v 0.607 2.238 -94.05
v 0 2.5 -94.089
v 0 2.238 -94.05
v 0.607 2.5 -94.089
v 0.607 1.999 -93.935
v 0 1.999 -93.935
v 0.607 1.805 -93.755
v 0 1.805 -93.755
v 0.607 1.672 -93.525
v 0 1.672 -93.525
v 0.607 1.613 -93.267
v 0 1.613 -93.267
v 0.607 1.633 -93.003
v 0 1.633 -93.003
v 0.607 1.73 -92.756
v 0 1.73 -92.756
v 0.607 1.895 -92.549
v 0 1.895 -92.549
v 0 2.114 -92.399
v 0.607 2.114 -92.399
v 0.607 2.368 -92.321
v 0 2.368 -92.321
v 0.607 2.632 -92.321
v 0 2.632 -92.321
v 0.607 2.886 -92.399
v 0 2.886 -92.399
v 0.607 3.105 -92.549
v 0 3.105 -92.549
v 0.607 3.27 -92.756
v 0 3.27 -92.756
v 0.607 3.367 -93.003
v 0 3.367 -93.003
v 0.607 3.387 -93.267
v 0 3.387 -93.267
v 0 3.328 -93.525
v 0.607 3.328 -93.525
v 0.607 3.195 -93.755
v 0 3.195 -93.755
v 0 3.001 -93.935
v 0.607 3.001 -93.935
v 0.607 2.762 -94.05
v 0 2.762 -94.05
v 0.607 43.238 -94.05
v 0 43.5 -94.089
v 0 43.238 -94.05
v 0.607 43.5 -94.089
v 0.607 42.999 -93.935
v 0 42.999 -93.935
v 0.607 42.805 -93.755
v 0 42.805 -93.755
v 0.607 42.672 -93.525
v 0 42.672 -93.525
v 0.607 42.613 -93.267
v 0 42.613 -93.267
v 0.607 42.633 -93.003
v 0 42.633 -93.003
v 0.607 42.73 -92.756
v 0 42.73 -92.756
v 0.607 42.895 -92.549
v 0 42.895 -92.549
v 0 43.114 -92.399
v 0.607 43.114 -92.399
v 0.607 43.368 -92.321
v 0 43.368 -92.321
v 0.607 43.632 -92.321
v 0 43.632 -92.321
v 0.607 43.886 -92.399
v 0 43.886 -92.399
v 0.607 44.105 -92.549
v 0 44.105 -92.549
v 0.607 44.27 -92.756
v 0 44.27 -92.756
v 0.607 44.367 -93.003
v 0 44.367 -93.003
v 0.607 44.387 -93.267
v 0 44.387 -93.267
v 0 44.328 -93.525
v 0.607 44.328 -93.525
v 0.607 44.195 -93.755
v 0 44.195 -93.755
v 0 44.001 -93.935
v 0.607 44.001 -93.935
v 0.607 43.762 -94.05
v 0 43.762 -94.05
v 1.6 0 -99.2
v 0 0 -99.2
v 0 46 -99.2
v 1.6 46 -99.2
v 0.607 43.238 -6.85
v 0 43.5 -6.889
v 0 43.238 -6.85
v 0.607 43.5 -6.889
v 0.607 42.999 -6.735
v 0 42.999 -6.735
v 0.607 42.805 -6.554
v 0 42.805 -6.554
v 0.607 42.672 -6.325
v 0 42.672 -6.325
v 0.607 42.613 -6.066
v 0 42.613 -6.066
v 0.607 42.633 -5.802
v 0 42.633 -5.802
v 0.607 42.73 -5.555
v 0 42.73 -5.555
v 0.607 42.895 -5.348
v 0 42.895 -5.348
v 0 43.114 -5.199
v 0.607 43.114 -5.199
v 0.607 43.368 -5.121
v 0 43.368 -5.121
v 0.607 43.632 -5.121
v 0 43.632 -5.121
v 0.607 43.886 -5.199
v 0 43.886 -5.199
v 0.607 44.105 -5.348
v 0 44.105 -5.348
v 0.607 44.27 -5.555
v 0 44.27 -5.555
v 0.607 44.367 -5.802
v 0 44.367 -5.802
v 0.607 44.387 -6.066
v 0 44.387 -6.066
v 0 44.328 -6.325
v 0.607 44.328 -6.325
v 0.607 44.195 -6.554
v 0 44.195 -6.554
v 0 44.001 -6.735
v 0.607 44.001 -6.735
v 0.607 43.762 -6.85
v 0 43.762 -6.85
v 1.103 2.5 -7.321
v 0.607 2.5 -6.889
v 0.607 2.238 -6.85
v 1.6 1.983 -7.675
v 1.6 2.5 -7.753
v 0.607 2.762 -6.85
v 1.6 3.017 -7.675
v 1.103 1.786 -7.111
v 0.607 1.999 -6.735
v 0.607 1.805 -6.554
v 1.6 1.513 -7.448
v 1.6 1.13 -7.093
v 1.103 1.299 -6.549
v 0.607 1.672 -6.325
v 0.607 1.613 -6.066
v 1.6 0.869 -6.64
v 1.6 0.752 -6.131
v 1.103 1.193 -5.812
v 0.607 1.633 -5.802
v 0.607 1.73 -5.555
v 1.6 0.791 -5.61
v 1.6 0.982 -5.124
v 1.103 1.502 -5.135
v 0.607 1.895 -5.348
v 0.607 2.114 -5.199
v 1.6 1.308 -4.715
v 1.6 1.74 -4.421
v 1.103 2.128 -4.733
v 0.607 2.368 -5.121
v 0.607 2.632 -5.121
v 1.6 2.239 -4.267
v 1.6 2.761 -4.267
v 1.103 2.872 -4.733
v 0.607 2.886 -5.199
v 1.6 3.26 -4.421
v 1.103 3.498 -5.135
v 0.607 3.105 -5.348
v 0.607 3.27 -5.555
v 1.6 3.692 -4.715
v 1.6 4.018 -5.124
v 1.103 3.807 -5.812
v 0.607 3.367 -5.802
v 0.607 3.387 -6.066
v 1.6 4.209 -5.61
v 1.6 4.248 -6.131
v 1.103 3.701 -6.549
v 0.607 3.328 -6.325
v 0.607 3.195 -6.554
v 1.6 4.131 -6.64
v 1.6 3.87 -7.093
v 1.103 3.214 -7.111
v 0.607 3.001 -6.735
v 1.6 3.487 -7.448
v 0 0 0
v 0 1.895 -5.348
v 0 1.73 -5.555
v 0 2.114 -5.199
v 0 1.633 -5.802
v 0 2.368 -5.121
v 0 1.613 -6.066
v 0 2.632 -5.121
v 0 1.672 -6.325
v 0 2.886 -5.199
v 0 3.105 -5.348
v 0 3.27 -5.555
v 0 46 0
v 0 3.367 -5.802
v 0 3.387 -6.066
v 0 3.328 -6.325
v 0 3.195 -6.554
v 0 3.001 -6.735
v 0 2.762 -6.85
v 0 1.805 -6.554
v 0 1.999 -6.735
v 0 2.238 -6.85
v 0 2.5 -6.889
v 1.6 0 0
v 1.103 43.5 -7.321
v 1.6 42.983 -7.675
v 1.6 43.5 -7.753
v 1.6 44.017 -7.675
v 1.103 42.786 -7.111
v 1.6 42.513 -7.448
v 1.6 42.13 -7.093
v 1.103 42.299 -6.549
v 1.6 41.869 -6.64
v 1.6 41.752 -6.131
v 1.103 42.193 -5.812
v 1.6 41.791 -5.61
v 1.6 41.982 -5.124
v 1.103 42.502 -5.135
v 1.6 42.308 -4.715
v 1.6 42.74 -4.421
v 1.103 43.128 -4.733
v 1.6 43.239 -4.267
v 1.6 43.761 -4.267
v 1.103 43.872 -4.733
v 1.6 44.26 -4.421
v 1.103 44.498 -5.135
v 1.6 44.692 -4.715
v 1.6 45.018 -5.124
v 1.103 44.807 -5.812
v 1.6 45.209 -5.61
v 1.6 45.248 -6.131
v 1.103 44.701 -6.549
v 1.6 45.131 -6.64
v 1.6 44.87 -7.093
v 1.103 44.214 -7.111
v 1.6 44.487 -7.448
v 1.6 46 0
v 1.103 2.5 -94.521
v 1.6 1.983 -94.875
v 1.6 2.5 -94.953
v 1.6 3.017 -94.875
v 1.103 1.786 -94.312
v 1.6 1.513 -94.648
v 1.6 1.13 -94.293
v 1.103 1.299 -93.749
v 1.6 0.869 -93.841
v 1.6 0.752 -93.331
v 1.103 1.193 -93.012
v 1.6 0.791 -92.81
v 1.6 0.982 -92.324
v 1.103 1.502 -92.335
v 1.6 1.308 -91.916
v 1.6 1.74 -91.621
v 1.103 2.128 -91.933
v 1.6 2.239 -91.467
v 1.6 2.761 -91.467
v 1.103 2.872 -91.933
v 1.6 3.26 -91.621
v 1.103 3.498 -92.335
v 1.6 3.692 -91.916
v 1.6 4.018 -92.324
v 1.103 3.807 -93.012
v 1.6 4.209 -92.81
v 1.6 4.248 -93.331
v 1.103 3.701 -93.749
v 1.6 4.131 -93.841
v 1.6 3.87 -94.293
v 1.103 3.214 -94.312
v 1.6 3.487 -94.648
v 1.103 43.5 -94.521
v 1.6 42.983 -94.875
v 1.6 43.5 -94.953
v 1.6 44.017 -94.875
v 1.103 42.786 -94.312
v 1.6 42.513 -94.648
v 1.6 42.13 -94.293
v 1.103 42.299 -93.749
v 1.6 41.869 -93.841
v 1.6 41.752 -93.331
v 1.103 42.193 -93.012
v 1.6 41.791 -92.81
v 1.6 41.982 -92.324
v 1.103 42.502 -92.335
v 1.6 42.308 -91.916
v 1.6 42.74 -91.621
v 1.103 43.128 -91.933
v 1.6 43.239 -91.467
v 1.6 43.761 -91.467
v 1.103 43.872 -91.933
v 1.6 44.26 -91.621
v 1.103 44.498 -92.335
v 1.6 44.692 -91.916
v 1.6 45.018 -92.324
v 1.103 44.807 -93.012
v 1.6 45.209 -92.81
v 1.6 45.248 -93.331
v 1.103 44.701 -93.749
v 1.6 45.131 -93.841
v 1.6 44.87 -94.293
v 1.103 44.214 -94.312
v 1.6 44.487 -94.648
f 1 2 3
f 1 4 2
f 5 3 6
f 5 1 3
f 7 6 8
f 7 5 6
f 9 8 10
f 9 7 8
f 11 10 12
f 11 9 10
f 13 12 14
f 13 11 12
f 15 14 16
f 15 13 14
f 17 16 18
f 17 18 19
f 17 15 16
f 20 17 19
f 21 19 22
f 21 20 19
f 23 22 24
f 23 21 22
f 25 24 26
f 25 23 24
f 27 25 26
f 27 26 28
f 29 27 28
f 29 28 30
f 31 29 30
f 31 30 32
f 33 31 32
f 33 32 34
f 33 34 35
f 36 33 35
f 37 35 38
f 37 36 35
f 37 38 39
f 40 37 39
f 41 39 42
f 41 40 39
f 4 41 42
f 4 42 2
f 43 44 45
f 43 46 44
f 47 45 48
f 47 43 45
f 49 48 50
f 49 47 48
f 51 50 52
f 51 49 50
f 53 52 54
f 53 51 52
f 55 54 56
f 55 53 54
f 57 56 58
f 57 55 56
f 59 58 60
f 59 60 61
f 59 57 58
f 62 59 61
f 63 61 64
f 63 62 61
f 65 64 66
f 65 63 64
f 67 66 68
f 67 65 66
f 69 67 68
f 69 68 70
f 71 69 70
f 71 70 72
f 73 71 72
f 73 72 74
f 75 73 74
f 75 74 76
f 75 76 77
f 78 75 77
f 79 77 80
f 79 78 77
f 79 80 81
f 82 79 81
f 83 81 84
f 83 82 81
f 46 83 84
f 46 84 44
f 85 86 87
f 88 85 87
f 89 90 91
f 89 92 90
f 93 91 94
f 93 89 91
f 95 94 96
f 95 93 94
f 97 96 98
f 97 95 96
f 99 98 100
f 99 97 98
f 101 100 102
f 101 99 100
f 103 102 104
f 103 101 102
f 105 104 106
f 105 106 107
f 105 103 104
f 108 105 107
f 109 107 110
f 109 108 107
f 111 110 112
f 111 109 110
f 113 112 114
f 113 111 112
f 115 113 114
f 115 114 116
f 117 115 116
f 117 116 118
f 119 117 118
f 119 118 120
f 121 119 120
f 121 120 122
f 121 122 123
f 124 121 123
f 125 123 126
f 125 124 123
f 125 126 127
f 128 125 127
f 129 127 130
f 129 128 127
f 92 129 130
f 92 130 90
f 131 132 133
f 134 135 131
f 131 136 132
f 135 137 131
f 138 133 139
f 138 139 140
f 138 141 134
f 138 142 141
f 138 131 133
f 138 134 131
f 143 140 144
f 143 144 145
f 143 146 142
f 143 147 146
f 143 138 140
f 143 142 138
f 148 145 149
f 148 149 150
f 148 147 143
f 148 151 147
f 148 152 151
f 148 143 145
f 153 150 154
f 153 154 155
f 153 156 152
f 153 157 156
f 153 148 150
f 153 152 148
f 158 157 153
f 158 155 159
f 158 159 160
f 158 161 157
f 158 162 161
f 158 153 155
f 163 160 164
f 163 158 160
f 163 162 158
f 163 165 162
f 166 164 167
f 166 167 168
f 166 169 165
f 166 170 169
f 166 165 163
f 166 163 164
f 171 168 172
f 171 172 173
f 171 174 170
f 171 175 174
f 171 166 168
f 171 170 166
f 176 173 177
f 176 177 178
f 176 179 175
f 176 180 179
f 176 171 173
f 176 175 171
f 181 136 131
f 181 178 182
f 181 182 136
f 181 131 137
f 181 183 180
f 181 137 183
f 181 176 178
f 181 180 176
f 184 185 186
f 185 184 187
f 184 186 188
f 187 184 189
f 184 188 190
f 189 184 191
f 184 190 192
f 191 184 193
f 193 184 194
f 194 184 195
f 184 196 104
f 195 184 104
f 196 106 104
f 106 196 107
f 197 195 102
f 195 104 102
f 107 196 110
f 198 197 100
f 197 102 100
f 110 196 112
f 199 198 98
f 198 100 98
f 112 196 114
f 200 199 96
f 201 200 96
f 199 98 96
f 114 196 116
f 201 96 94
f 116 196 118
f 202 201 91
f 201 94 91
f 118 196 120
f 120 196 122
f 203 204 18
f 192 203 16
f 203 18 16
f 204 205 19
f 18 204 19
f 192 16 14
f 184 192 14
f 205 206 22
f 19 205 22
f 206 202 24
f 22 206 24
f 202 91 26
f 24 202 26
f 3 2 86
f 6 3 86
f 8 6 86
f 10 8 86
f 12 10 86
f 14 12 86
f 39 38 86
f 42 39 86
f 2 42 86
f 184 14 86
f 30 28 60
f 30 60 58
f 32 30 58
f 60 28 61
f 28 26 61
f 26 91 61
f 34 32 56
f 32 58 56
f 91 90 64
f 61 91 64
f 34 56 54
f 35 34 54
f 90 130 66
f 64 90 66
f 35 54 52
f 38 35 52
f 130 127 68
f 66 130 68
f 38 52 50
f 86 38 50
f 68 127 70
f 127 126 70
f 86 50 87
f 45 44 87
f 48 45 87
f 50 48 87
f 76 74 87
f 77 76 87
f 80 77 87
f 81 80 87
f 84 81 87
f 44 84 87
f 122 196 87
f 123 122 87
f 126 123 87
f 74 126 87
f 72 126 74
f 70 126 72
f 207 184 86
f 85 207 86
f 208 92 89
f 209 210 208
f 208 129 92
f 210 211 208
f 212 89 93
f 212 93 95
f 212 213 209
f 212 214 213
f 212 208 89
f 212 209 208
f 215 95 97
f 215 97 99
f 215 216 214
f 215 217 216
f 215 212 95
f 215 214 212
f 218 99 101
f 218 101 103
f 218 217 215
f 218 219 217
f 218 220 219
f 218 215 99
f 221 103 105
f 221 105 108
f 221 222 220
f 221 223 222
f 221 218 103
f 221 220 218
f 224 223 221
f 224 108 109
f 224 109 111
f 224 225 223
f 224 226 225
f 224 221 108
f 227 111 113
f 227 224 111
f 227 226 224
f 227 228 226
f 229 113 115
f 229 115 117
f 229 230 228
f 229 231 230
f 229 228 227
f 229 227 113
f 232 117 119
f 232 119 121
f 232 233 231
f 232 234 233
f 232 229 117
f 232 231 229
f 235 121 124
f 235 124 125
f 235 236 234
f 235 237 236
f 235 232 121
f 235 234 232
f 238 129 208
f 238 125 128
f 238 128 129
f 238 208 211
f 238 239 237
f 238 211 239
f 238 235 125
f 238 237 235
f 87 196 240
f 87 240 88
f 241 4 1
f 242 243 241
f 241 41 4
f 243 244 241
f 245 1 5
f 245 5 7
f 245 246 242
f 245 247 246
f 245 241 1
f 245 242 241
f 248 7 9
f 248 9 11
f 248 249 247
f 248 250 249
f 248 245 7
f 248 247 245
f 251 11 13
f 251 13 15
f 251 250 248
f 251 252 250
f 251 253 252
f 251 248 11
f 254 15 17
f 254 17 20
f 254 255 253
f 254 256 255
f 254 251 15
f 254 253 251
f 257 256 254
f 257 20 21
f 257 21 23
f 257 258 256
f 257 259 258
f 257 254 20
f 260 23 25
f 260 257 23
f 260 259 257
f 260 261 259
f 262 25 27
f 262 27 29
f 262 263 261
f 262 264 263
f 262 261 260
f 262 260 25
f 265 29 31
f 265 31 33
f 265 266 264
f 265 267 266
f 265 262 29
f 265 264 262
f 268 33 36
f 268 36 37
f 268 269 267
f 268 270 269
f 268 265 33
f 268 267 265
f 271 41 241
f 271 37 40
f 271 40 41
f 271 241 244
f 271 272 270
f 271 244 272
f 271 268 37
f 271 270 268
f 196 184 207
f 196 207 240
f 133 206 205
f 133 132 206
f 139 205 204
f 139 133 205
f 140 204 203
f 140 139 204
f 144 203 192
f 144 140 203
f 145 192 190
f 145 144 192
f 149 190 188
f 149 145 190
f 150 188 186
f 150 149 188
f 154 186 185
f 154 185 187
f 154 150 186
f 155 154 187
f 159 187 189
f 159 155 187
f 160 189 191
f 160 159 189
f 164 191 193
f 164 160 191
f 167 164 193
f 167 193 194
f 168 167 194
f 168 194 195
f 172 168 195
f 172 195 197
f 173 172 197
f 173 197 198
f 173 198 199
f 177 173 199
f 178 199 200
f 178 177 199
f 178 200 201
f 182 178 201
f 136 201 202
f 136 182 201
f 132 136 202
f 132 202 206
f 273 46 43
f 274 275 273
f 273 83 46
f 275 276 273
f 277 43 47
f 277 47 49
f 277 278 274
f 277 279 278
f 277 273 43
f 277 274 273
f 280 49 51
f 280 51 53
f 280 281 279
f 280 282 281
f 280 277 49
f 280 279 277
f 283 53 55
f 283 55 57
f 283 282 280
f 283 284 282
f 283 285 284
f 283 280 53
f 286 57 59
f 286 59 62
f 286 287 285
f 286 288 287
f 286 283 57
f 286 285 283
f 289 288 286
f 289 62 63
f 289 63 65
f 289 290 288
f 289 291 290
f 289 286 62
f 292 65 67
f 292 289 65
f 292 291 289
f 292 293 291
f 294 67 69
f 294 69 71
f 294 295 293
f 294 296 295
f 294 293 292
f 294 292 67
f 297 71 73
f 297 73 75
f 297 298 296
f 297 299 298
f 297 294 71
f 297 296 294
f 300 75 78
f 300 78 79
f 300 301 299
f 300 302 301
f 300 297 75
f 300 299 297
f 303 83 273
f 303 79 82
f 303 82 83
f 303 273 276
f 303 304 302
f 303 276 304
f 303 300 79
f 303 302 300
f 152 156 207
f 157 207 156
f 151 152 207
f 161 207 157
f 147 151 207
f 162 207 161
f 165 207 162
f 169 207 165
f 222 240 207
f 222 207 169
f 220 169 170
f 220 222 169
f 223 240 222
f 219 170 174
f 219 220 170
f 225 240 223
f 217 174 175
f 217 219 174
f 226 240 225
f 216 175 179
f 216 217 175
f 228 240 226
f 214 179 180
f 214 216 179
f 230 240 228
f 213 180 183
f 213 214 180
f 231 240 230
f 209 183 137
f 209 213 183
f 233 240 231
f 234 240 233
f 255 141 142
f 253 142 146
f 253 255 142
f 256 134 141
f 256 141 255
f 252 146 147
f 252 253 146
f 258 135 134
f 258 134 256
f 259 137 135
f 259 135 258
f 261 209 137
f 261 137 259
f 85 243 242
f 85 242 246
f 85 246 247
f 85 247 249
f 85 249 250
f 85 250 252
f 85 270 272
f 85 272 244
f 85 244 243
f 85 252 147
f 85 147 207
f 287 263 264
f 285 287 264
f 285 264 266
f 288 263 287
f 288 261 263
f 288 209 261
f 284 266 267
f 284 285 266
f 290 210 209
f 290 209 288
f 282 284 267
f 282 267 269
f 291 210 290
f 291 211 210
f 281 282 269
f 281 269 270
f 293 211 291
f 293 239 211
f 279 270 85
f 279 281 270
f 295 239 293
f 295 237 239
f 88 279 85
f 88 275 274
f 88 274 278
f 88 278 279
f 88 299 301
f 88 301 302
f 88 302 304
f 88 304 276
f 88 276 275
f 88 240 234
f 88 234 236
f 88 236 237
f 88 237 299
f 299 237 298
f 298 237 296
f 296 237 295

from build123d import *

# Parameters (mm, degrees)
SKETCH1_W                                     = 99.2004
SKETCH1_H                                     = 46
BOSS_EXTRUDE1_DEPTH                           = 1.6002
CSK_FOR_0_FLAT_HEAD_SOCKET_CAP_SCREW1_A_COUNT = 2
CSK_FOR_0_FLAT_HEAD_SOCKET_CAP_SCREW1_A_PITCH = 41
CSK_FOR_0_FLAT_HEAD_SOCKET_CAP_SCRE_2_COUNT   = 2
CSK_FOR_0_FLAT_HEAD_SOCKET_CAP_SCRE_2_PITCH   = 96.358236597
CSK_FOR_0_FLAT_HEAD_SOCKET_CAP_SCRE_3_COUNT   = 2
CSK_FOR_0_FLAT_HEAD_SOCKET_CAP_SCRE_3_PITCH   = 87.2004


with BuildPart() as part:
    # Sketch1 → Boss-Extrude1 (new body)
    with BuildSketch(Plane(origin=(0, 0, 0), x_dir=(0, 0, -1), z_dir=(1, 0, 0))):
        with Locations((49.6002, 23)):
            Rectangle(SKETCH1_W, SKETCH1_H)
    extrude(amount=BOSS_EXTRUDE1_DEPTH)

    # Sketch4 → CSK for #0 Flat Head Socket Cap Screw1 (revolve, cut)
    with BuildSketch(Plane(origin=(1.6002, 43.5, -6), x_dir=(0, 0, -1), z_dir=(0, 1, 0))):
        Polygon((0, 0), (0, 1.6002), (0.889, 1.6002), (0.889, 0.993458156), (1.7526, 0), align=None)
    csk_for_0_flat_head_socket_cap_screw1 = revolve(axis=Axis((7.9502, 43.5, -6), (-1, 0, 0)), mode=Mode.SUBTRACT)

    # CSK for #0 Flat Head Socket Cap Screw1 a: CSK for #0 Flat Head Socket Cap Screw1 ×2
    with Locations(*[(0, -i * CSK_FOR_0_FLAT_HEAD_SOCKET_CAP_SCREW1_A_PITCH, 0) for i in range(1, CSK_FOR_0_FLAT_HEAD_SOCKET_CAP_SCREW1_A_COUNT)]):
        add(csk_for_0_flat_head_socket_cap_screw1, mode=Mode.SUBTRACT)

    # CSK for _0 Flat Head Socket Cap Scre 2: CSK for #0 Flat Head Socket Cap Screw1 ×2
    with Locations(*[Vector(0, -0.425495541, -0.904960521) * (i * CSK_FOR_0_FLAT_HEAD_SOCKET_CAP_SCRE_2_PITCH) for i in range(1, CSK_FOR_0_FLAT_HEAD_SOCKET_CAP_SCRE_2_COUNT)]):
        add(csk_for_0_flat_head_socket_cap_screw1, mode=Mode.SUBTRACT)

    # CSK for _0 Flat Head Socket Cap Scre 3: CSK for #0 Flat Head Socket Cap Screw1 ×2
    with Locations(*[(0, 0, -i * CSK_FOR_0_FLAT_HEAD_SOCKET_CAP_SCRE_3_PITCH) for i in range(1, CSK_FOR_0_FLAT_HEAD_SOCKET_CAP_SCRE_3_COUNT)]):
        add(csk_for_0_flat_head_socket_cap_screw1, mode=Mode.SUBTRACT)


solid = part.part
